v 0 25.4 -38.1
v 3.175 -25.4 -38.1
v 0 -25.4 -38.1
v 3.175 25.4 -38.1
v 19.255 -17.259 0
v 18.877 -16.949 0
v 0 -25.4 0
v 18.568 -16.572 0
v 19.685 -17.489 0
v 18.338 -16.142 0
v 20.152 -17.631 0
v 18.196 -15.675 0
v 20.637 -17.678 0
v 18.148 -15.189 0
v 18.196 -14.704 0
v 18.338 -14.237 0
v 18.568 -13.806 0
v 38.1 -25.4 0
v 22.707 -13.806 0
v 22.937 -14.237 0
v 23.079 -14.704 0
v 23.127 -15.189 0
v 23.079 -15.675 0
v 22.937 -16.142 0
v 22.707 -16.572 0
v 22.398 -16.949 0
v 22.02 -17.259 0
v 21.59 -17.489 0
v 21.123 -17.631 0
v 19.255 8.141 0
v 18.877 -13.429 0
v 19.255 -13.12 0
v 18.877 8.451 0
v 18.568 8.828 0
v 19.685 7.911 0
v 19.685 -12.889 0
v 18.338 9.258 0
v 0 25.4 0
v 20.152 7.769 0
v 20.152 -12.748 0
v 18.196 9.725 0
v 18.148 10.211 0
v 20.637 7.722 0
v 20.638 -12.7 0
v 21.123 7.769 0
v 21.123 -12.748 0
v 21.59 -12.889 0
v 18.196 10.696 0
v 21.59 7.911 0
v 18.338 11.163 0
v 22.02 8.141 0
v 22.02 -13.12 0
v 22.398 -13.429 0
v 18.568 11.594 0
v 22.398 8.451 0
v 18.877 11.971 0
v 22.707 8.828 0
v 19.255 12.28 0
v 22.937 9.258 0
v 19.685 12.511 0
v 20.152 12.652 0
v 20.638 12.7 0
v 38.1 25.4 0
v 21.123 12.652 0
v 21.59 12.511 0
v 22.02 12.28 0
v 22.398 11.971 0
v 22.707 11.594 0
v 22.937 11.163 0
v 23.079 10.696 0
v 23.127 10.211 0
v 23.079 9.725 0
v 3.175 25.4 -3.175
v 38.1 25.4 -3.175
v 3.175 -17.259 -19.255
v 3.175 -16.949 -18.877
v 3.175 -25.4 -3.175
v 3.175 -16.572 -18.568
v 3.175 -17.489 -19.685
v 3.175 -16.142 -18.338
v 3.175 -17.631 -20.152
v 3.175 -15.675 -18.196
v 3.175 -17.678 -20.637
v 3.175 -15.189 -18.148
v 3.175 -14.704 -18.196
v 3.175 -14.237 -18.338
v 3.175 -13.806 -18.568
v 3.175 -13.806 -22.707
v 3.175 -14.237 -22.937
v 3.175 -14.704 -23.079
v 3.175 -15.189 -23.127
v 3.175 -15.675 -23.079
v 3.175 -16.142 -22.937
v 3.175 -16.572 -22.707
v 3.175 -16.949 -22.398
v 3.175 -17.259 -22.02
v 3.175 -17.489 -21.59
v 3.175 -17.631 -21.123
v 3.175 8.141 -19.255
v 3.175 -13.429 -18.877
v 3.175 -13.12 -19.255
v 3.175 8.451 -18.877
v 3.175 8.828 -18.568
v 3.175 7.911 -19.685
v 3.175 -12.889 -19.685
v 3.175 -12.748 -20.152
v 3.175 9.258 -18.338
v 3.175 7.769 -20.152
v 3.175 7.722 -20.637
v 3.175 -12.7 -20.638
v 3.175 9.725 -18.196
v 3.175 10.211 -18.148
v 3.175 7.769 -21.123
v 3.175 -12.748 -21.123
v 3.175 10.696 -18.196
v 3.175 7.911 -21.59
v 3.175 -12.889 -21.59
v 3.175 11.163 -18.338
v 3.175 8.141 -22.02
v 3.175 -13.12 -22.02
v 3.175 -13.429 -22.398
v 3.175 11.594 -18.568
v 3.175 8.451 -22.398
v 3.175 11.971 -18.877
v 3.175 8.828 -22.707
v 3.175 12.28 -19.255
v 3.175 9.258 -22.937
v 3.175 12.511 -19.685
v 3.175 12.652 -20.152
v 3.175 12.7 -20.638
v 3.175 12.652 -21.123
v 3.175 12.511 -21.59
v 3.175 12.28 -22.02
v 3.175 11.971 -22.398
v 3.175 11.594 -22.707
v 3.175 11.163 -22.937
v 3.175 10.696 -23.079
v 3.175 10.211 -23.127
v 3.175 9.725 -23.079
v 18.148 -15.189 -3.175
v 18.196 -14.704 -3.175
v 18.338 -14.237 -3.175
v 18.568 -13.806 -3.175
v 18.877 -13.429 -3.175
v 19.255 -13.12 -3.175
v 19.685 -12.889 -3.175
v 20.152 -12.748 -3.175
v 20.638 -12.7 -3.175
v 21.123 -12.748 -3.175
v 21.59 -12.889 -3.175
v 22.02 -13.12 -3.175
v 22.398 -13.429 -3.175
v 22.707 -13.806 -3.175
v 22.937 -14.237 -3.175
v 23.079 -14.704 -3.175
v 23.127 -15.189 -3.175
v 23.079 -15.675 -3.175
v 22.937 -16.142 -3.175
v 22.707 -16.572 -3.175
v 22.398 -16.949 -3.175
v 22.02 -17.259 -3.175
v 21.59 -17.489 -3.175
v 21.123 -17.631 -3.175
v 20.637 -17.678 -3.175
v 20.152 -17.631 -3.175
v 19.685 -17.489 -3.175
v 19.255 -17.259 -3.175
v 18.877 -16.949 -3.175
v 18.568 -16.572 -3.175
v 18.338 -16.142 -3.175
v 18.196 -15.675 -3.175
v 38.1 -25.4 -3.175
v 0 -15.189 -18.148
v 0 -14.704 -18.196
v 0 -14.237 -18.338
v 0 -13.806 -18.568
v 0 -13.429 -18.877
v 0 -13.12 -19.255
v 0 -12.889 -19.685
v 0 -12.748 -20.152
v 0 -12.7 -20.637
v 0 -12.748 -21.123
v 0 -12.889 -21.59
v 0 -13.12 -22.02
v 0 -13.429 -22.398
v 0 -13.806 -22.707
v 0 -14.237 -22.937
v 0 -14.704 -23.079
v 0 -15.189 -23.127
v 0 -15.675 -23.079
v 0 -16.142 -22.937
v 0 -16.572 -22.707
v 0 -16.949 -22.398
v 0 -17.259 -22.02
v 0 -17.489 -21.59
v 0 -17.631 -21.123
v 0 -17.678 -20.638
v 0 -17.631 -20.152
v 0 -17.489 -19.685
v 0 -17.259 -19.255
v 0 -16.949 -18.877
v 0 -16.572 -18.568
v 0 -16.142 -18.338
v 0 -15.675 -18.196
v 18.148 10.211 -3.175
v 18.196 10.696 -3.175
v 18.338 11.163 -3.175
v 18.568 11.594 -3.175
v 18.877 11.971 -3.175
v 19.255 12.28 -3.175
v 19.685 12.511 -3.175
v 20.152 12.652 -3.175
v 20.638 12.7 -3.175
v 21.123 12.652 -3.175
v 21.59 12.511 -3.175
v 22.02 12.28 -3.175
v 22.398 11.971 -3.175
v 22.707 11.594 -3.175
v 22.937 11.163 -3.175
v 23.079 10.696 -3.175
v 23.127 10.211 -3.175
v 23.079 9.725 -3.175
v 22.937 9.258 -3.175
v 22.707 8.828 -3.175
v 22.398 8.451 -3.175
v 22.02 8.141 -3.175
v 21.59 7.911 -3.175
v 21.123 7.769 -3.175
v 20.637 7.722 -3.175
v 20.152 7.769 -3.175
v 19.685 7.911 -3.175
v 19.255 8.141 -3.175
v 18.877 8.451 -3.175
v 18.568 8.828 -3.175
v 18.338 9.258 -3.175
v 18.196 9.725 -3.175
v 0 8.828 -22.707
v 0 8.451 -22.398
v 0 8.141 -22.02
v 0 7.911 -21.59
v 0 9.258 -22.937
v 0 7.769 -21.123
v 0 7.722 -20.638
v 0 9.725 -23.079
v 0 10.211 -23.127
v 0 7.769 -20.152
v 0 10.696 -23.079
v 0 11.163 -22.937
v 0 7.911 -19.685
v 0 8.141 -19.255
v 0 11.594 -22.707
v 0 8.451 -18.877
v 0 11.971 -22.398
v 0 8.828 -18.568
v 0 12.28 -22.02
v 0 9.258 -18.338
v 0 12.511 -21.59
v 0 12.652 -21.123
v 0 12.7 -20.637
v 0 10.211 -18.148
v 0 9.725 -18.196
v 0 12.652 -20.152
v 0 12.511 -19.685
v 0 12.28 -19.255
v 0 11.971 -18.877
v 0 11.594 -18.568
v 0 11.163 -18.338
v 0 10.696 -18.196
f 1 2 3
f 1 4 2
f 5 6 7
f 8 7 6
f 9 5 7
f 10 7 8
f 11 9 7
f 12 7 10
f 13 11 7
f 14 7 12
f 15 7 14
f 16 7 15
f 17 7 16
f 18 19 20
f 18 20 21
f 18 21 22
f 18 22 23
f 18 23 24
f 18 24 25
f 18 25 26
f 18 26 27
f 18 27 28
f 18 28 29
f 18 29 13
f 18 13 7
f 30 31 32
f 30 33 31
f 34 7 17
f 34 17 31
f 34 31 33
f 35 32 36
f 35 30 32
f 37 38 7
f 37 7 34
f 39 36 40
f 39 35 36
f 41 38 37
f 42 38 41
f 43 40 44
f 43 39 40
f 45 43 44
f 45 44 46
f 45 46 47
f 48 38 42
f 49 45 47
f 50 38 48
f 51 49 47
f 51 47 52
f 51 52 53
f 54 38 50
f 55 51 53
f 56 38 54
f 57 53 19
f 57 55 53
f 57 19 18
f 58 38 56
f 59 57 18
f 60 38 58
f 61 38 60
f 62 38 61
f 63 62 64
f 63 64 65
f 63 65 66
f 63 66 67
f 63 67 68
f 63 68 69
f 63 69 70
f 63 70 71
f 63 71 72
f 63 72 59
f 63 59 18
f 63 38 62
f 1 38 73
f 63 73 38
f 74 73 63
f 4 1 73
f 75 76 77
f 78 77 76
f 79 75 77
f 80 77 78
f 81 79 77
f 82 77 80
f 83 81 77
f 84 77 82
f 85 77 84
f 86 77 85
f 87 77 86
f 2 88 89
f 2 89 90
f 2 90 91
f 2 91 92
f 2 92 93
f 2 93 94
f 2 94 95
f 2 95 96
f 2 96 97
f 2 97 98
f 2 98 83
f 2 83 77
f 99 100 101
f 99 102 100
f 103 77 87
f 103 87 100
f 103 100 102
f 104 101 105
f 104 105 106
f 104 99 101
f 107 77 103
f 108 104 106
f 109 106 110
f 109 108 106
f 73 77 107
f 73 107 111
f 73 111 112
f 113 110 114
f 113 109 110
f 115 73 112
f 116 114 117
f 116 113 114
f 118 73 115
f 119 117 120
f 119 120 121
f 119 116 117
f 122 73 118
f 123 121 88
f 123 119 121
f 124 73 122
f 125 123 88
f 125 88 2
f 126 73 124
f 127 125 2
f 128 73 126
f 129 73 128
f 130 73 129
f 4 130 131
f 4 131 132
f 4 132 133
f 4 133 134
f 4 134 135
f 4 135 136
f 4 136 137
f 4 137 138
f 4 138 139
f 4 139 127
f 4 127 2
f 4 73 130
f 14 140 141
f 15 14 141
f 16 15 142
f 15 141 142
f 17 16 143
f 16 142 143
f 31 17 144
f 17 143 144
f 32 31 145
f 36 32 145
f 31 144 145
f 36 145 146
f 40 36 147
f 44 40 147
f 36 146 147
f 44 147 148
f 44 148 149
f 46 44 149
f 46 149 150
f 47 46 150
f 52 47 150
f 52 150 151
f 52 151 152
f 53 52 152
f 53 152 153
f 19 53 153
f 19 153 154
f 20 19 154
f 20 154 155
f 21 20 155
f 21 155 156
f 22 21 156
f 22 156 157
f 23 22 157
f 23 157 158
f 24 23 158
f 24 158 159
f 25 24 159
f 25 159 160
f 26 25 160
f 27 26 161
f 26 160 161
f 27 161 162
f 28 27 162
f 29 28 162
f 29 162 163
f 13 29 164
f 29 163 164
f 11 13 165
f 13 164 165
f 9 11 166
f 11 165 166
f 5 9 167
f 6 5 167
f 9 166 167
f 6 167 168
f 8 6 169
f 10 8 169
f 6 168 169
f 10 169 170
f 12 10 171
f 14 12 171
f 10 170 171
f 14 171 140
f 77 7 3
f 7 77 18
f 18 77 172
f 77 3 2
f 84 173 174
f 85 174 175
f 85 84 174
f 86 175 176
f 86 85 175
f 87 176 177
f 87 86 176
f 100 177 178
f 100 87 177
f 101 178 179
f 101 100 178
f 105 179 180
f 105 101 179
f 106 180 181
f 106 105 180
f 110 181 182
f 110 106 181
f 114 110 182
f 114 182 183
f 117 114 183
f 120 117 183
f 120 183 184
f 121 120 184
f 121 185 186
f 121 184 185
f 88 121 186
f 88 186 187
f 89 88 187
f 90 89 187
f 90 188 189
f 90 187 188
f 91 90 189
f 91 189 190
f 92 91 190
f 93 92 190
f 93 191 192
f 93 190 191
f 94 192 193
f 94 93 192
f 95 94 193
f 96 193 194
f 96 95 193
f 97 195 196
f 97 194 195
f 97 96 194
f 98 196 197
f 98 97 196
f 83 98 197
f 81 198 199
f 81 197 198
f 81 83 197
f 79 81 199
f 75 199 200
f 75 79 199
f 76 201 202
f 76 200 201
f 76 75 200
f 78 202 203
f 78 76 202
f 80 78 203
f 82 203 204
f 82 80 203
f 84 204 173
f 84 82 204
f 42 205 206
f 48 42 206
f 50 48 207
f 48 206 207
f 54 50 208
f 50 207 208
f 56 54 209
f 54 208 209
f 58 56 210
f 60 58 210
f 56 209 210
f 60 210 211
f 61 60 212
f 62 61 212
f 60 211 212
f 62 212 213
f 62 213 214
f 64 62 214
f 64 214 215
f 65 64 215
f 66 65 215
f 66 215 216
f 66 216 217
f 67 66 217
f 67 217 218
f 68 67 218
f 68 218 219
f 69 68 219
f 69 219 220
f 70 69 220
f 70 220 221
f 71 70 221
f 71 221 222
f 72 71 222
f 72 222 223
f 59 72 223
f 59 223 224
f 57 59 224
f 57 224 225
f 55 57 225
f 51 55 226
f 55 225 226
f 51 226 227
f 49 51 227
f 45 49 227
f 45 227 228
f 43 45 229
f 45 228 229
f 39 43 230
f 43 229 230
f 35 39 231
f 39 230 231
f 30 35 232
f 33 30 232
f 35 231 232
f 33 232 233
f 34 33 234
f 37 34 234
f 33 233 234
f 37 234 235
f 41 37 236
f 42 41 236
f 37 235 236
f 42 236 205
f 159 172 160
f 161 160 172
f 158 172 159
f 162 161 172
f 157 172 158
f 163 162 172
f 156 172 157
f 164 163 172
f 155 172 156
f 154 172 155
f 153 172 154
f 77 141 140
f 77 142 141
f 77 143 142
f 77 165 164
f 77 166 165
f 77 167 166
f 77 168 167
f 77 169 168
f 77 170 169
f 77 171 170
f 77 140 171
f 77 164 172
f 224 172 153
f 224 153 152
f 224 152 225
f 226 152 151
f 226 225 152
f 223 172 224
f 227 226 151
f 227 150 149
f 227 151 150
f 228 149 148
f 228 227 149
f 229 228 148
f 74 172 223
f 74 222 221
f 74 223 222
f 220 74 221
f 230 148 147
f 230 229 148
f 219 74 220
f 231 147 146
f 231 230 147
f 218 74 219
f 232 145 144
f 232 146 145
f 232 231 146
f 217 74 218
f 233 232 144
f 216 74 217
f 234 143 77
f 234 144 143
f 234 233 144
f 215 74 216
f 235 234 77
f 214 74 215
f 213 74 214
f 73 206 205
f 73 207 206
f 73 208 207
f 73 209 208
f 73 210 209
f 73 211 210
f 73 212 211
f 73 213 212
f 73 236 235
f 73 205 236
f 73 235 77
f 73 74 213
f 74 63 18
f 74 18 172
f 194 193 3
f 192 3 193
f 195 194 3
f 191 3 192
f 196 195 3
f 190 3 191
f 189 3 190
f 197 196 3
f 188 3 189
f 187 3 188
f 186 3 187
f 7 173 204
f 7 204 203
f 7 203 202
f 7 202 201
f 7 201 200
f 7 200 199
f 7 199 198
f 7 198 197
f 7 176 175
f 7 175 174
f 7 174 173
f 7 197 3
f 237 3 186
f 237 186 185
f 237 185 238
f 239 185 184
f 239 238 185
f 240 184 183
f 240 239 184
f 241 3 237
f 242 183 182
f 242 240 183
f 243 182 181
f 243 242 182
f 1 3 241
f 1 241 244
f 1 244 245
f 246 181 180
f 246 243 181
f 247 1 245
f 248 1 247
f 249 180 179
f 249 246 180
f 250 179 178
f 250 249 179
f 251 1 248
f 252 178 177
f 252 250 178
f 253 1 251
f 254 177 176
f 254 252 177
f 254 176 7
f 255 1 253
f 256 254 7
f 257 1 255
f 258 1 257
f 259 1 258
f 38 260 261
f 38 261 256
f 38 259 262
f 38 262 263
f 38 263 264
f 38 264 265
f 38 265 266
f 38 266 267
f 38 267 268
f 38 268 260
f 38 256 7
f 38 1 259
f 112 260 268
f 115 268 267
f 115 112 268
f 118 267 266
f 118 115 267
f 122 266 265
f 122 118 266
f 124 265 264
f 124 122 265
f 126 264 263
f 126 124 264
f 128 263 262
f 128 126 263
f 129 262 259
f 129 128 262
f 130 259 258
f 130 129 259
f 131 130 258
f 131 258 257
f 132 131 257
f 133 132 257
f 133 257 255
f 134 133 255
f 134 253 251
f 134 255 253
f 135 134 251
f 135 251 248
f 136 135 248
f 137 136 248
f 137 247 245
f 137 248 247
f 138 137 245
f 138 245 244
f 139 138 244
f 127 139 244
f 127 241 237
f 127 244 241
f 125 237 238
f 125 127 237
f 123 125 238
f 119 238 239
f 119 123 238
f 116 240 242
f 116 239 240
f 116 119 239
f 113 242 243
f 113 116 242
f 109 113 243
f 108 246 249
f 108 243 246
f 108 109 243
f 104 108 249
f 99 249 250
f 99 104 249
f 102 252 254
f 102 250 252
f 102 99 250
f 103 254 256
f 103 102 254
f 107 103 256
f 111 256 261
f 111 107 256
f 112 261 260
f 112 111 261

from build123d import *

# Parameters (mm, degrees)
EXTRUDE_THIN1_DEPTH = 25.4
SKETCH2_R           = 2.4892
CUT_EXTRUDE1_DEPTH  = 4.175


with BuildPart() as part:
    # Sketch1 → Extrude-Thin1 (new body, symmetric)
    with BuildSketch(Plane(origin=(0, 0, 0), x_dir=(1, 0, 0), z_dir=(0, 1, 0))):
        Polygon((0, 38.1), (0, 0), (38.1, 0), (38.1, 3.175), (3.175, 3.175), (3.175, 38.1), align=None)
    extrude(amount=EXTRUDE_THIN1_DEPTH, both=True)

    # Sketch2 → Cut-Extrude1 (cut, through all)
    with BuildSketch(Plane(origin=(0, 0, -3.175), x_dir=(-1, 0, 0), z_dir=(0, 0, -1))):
        with Locations((-20.6375, 10.2108)):
            Circle(SKETCH2_R)
        with Locations((-20.6375, -15.1892)):
            Circle(SKETCH2_R)
    cut_extrude1 = extrude(amount=-CUT_EXTRUDE1_DEPTH, mode=Mode.SUBTRACT)

    # Mirror1: Cut-Extrude1 across plane
    add(cut_extrude1.mirror(Plane(origin=(0, 0, 0), x_dir=(-0.707106781, 0, 0.707106781), z_dir=(-0.707106781, 0, -0.707106781))), mode=Mode.SUBTRACT)


solid = part.part
